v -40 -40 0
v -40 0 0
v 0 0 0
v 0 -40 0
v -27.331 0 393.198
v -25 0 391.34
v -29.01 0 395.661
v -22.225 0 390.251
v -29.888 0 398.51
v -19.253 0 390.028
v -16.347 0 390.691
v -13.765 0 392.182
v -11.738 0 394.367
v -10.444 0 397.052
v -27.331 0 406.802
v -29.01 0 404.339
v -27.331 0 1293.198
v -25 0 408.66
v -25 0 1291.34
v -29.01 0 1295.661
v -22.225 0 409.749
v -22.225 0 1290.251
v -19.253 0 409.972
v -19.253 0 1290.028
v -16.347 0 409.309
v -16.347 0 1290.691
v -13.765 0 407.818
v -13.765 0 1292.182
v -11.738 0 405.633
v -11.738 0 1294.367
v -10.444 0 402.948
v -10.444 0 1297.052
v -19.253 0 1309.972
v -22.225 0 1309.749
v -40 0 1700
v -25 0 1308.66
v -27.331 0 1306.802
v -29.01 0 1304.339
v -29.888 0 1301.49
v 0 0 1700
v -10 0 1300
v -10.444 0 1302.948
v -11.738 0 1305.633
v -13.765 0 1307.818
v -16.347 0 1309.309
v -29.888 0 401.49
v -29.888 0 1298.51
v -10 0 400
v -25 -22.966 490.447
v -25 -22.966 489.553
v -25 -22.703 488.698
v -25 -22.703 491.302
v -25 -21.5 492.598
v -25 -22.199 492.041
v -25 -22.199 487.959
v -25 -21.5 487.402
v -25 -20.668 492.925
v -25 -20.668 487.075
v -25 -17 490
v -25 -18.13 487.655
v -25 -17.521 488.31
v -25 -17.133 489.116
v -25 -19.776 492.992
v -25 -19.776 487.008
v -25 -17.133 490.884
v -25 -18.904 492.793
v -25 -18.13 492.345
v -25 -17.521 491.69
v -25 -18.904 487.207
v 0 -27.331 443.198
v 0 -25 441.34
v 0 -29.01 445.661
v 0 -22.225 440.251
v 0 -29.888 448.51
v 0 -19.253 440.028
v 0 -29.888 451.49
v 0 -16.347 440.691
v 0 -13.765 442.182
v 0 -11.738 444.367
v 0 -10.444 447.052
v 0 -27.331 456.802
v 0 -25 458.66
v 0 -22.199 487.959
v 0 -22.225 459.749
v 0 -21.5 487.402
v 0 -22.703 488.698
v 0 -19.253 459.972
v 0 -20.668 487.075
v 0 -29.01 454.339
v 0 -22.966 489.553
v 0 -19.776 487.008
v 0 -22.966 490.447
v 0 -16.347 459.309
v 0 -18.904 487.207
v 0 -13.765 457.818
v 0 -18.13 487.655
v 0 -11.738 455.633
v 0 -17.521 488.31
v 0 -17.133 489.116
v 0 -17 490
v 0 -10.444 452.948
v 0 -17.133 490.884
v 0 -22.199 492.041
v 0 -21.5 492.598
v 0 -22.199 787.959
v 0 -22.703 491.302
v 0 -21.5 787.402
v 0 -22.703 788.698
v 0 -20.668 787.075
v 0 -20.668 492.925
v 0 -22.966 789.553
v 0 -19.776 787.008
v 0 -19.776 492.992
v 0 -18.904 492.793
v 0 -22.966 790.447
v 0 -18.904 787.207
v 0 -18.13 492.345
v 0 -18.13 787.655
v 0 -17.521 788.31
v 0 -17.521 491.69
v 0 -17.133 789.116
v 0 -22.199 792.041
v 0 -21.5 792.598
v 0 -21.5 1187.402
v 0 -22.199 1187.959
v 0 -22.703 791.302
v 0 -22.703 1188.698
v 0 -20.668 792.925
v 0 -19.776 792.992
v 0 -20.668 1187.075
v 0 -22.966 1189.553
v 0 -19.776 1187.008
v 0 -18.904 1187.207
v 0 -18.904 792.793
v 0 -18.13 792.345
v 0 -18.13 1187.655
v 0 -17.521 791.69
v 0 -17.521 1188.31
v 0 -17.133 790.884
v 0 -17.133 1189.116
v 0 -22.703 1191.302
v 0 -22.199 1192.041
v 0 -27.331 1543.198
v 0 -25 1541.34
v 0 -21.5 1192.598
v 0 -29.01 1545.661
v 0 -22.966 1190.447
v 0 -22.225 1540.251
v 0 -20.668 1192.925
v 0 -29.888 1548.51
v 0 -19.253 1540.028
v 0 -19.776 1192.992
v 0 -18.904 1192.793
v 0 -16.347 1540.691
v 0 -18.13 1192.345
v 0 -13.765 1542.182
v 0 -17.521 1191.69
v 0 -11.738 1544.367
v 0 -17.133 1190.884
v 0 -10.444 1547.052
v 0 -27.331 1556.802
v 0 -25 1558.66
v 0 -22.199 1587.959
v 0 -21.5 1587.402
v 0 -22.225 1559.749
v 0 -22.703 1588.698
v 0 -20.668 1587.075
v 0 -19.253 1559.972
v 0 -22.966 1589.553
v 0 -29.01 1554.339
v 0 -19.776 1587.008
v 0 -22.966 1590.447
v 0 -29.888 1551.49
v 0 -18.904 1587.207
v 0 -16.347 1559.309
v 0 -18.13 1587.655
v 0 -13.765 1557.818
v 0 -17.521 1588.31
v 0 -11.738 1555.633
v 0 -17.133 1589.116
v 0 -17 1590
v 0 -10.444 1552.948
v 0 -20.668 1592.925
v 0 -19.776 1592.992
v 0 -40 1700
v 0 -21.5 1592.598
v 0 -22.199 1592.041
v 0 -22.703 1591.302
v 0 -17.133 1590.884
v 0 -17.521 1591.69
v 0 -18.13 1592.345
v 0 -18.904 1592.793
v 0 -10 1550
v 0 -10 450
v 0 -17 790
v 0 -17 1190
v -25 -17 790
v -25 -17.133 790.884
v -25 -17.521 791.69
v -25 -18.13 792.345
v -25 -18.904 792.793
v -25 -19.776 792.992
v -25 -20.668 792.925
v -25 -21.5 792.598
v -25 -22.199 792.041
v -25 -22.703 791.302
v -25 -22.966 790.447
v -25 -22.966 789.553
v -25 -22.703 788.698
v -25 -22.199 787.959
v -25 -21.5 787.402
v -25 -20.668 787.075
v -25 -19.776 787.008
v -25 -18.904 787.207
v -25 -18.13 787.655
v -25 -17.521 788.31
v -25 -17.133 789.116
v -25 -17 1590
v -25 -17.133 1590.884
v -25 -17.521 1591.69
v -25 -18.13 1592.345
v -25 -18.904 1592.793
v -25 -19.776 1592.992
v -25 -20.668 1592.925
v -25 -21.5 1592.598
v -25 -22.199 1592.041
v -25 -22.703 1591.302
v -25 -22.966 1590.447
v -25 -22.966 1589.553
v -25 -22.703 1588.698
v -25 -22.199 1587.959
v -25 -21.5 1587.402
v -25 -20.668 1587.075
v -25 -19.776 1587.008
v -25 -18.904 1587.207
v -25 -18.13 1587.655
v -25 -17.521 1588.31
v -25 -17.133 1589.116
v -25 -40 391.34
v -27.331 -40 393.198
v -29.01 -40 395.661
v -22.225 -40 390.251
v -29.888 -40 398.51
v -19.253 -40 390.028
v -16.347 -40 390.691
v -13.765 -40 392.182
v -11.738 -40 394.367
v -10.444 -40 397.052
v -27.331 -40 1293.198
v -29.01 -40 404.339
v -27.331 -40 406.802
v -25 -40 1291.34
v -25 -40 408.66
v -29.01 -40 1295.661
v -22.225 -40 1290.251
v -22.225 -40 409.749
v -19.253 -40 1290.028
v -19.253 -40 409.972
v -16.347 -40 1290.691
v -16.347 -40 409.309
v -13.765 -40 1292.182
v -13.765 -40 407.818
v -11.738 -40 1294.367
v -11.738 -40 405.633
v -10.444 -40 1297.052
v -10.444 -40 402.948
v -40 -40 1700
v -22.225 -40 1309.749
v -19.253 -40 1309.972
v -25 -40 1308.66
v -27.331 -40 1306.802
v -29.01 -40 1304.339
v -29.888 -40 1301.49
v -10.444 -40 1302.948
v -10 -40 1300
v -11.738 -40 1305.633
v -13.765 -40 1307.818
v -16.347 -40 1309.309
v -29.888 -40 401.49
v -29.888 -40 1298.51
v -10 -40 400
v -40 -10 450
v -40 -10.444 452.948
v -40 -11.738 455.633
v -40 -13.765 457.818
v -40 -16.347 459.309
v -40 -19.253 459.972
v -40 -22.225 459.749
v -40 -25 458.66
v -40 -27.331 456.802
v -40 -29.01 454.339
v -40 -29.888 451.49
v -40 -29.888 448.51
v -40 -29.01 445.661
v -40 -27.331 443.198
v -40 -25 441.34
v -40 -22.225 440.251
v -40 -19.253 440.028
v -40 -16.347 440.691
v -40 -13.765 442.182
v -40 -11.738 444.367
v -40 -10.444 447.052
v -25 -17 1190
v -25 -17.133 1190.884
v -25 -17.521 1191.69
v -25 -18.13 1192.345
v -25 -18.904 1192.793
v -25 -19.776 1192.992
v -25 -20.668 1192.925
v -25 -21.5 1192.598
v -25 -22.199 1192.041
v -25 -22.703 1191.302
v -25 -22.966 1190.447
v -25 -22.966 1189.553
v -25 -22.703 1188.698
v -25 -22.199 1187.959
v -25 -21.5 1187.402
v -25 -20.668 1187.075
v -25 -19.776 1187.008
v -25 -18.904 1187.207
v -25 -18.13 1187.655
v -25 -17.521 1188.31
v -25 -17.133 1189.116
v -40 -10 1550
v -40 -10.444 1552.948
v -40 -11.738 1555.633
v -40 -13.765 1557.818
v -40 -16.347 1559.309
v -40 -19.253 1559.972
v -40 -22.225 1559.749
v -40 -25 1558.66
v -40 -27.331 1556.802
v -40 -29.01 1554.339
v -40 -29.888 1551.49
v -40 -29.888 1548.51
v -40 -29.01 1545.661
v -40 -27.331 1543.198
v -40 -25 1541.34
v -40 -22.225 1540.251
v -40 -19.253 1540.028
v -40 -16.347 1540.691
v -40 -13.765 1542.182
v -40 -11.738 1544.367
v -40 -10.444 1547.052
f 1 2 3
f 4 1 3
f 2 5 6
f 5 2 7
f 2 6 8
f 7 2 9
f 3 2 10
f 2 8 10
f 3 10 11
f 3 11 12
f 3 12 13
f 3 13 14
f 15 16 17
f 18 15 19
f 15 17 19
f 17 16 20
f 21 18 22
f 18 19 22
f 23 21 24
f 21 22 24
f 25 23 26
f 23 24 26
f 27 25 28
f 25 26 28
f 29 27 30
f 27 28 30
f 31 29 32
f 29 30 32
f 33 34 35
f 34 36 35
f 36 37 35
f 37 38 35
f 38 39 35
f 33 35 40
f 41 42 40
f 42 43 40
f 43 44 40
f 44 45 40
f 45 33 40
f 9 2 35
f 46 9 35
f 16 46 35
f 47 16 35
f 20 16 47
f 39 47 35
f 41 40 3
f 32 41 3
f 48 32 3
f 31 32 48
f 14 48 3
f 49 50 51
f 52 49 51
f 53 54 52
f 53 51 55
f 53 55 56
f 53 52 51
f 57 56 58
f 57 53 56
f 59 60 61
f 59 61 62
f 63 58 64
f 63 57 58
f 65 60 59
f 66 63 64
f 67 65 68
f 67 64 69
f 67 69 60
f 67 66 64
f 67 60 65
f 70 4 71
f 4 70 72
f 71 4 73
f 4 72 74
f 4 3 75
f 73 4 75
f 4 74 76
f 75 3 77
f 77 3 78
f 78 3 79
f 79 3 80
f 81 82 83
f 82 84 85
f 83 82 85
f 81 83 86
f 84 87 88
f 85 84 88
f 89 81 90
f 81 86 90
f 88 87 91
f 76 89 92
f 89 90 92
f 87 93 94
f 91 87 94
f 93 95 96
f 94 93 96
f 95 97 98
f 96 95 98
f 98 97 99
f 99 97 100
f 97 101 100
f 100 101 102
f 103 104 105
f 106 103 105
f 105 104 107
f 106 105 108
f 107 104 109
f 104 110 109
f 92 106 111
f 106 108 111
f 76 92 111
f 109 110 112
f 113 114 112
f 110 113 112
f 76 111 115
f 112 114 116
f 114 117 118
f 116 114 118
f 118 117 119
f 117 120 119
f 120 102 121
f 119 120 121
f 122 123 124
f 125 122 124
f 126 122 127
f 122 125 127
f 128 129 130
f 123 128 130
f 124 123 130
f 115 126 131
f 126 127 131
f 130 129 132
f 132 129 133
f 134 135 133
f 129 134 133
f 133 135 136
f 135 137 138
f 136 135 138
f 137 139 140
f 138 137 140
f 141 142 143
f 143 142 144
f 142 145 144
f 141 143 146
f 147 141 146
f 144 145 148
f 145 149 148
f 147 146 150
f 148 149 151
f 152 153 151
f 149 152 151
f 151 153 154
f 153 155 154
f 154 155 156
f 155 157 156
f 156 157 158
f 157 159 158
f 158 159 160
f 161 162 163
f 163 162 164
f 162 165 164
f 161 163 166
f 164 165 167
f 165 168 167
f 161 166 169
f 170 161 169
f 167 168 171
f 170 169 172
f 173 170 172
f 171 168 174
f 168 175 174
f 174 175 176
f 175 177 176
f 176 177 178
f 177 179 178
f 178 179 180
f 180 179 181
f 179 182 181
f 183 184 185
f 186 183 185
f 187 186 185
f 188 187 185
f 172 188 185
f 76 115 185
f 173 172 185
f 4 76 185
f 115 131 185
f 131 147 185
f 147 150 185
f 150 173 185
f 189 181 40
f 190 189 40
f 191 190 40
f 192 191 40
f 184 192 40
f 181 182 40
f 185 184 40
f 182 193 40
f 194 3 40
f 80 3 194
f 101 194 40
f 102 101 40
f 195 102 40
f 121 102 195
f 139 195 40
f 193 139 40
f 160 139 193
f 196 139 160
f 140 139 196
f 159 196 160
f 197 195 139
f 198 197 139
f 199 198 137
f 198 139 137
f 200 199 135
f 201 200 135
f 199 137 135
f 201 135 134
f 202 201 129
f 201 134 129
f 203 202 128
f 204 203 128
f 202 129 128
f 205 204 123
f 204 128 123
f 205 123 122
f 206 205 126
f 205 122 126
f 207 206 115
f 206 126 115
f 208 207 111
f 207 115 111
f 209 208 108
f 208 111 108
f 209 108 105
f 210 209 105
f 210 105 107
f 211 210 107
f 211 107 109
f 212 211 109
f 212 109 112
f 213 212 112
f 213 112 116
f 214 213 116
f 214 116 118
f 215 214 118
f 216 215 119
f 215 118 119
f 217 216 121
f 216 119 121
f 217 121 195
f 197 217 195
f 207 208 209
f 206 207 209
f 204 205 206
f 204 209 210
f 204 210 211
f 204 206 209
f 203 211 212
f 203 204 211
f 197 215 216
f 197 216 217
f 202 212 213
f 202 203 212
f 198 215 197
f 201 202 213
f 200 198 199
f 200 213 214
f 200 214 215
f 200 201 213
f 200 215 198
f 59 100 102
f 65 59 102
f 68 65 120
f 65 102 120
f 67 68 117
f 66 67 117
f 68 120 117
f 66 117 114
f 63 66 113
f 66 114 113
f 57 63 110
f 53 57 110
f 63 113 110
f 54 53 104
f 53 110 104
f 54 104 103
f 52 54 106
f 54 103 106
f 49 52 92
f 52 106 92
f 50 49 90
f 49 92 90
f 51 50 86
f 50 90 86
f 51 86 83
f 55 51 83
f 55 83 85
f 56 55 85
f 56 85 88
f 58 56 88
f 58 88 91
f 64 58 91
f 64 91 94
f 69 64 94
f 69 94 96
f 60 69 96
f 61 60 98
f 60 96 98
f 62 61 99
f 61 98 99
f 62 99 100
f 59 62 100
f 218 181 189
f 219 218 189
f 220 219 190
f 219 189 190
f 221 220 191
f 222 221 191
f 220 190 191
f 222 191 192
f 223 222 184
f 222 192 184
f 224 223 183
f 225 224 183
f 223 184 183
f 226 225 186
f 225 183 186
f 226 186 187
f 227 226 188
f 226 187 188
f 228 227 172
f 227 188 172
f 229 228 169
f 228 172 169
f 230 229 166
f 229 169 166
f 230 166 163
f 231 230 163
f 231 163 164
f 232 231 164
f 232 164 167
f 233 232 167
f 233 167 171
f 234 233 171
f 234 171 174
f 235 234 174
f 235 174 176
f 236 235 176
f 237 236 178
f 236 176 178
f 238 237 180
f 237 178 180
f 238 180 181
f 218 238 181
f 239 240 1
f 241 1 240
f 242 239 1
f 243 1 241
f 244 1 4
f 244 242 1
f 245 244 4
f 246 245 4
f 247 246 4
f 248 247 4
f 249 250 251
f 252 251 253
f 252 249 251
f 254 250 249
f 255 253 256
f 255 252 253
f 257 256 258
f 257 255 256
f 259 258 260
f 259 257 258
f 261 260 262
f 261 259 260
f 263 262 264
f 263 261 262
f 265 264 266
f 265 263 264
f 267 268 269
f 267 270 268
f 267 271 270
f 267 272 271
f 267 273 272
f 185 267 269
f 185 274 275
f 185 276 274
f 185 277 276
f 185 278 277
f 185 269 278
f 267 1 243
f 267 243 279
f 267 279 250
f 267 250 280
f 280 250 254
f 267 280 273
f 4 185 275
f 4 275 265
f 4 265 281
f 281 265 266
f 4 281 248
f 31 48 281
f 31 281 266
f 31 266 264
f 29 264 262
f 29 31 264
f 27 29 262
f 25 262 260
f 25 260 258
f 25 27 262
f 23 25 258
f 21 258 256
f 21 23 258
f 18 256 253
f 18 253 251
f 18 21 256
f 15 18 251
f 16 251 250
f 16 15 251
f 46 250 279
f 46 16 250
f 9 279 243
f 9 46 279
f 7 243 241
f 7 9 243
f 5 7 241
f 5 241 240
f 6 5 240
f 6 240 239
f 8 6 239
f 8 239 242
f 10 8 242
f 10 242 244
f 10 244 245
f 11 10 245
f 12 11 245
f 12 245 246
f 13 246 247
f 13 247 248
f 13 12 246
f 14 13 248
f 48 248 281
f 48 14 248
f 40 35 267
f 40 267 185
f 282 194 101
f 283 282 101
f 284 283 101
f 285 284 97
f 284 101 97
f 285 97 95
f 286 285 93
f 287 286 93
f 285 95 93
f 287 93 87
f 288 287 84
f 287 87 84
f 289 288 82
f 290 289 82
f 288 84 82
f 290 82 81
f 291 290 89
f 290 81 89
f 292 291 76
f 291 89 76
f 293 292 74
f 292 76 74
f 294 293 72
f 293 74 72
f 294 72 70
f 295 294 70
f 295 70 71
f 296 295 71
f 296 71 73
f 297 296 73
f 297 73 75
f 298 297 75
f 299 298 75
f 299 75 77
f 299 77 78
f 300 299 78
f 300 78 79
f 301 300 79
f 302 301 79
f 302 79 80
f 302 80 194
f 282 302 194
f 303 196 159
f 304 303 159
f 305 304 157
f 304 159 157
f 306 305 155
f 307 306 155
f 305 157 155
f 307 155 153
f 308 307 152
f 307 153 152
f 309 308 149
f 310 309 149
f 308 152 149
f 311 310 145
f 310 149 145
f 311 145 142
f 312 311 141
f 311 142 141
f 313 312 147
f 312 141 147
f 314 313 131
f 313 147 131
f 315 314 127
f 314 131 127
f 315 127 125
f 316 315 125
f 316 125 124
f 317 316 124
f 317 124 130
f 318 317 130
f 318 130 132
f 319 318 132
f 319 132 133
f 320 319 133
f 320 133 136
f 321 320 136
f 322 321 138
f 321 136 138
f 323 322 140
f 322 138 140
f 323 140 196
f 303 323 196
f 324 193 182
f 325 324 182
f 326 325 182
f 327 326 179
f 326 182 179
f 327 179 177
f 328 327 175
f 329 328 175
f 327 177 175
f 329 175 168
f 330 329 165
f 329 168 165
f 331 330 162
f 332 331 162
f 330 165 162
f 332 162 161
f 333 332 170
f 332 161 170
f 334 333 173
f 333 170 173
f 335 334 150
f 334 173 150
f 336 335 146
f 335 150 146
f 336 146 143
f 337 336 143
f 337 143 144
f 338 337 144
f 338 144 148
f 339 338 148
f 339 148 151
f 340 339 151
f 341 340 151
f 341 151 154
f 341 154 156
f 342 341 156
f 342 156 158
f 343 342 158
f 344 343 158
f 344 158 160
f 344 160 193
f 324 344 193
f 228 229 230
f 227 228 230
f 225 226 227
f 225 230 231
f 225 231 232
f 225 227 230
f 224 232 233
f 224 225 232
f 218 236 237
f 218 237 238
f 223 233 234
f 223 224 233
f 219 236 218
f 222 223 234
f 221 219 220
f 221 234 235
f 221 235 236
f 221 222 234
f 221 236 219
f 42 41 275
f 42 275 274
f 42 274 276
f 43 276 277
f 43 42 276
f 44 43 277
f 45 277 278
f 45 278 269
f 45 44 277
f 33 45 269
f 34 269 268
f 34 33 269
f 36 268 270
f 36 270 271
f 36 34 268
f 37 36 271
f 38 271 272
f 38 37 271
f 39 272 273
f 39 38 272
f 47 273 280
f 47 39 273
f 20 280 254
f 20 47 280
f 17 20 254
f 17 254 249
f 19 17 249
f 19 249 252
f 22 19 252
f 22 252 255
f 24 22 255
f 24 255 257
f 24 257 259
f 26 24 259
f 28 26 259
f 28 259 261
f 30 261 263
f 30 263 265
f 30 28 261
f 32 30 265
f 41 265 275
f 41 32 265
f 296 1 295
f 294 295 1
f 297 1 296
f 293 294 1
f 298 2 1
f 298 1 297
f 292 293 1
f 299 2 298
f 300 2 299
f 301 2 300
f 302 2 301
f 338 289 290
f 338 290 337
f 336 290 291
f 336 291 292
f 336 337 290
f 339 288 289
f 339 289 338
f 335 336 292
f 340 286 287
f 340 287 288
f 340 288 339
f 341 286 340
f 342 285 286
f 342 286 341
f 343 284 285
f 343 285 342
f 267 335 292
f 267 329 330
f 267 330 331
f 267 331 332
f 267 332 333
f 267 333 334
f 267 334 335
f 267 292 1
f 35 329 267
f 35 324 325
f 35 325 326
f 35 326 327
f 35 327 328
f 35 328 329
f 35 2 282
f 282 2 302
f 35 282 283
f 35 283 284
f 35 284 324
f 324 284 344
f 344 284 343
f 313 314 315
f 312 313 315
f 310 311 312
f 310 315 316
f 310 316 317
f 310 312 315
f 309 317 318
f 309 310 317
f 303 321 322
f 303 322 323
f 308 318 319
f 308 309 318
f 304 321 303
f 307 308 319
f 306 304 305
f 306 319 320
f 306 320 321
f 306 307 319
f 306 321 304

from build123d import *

# Parameters (mm, degrees)
F0_W     = 40
F0_H     = 1700
F0_R     = 10
F1_DEPTH = 40
F7_R     = 10
F2_DEPTH = 40.001
F3_DEPTH = 40.001
F7_R_2   = 3
F4_DEPTH = 25
F8_DEPTH = 25
F5_DEPTH = 25
F6_DEPTH = 25


with BuildPart() as f1:
    # F0 (on Front) → F1 (new body)
    with BuildSketch(Plane.XZ):
        with Locations((-20, 850)):
            Rectangle(F0_W, F0_H)
        with Locations((-20, 400)):
            Circle(F0_R, mode=Mode.SUBTRACT)
        with Locations((-20, 1300)):
            Circle(F0_R, mode=Mode.SUBTRACT)
    extrude(amount=F1_DEPTH)

    # F7 (on face) → F2 (cut, through all)
    with BuildSketch(Plane.YZ):
        with Locations((-20, 450)):
            Circle(F7_R)
    extrude(amount=-F2_DEPTH, mode=Mode.SUBTRACT)

    # F7 (on face) → F3 (cut, through all)
    with BuildSketch(Plane.YZ):
        with Locations((-20, 1550)):
            Circle(F7_R)
    extrude(amount=-F3_DEPTH, mode=Mode.SUBTRACT)

    # F7 (on face) → F4 (cut)
    with BuildSketch(Plane.YZ):
        with Locations((-20, 490)):
            Circle(F7_R_2)
    extrude(amount=-F4_DEPTH, mode=Mode.SUBTRACT)

    # F7 (on face) → F8 (cut)
    with BuildSketch(Plane.YZ):
        with Locations((-20, 790)):
            Circle(F7_R_2)
    extrude(amount=-F8_DEPTH, mode=Mode.SUBTRACT)

    # F7 (on face) → F5 (cut)
    with BuildSketch(Plane.YZ):
        with Locations((-20, 1190)):
            Circle(F7_R_2)
    extrude(amount=-F5_DEPTH, mode=Mode.SUBTRACT)

    # F7 (on face) → F6 (cut)
    with BuildSketch(Plane.YZ):
        with Locations((-20, 1590)):
            Circle(F7_R_2)
    extrude(amount=-F6_DEPTH, mode=Mode.SUBTRACT)


solid = f1.part
